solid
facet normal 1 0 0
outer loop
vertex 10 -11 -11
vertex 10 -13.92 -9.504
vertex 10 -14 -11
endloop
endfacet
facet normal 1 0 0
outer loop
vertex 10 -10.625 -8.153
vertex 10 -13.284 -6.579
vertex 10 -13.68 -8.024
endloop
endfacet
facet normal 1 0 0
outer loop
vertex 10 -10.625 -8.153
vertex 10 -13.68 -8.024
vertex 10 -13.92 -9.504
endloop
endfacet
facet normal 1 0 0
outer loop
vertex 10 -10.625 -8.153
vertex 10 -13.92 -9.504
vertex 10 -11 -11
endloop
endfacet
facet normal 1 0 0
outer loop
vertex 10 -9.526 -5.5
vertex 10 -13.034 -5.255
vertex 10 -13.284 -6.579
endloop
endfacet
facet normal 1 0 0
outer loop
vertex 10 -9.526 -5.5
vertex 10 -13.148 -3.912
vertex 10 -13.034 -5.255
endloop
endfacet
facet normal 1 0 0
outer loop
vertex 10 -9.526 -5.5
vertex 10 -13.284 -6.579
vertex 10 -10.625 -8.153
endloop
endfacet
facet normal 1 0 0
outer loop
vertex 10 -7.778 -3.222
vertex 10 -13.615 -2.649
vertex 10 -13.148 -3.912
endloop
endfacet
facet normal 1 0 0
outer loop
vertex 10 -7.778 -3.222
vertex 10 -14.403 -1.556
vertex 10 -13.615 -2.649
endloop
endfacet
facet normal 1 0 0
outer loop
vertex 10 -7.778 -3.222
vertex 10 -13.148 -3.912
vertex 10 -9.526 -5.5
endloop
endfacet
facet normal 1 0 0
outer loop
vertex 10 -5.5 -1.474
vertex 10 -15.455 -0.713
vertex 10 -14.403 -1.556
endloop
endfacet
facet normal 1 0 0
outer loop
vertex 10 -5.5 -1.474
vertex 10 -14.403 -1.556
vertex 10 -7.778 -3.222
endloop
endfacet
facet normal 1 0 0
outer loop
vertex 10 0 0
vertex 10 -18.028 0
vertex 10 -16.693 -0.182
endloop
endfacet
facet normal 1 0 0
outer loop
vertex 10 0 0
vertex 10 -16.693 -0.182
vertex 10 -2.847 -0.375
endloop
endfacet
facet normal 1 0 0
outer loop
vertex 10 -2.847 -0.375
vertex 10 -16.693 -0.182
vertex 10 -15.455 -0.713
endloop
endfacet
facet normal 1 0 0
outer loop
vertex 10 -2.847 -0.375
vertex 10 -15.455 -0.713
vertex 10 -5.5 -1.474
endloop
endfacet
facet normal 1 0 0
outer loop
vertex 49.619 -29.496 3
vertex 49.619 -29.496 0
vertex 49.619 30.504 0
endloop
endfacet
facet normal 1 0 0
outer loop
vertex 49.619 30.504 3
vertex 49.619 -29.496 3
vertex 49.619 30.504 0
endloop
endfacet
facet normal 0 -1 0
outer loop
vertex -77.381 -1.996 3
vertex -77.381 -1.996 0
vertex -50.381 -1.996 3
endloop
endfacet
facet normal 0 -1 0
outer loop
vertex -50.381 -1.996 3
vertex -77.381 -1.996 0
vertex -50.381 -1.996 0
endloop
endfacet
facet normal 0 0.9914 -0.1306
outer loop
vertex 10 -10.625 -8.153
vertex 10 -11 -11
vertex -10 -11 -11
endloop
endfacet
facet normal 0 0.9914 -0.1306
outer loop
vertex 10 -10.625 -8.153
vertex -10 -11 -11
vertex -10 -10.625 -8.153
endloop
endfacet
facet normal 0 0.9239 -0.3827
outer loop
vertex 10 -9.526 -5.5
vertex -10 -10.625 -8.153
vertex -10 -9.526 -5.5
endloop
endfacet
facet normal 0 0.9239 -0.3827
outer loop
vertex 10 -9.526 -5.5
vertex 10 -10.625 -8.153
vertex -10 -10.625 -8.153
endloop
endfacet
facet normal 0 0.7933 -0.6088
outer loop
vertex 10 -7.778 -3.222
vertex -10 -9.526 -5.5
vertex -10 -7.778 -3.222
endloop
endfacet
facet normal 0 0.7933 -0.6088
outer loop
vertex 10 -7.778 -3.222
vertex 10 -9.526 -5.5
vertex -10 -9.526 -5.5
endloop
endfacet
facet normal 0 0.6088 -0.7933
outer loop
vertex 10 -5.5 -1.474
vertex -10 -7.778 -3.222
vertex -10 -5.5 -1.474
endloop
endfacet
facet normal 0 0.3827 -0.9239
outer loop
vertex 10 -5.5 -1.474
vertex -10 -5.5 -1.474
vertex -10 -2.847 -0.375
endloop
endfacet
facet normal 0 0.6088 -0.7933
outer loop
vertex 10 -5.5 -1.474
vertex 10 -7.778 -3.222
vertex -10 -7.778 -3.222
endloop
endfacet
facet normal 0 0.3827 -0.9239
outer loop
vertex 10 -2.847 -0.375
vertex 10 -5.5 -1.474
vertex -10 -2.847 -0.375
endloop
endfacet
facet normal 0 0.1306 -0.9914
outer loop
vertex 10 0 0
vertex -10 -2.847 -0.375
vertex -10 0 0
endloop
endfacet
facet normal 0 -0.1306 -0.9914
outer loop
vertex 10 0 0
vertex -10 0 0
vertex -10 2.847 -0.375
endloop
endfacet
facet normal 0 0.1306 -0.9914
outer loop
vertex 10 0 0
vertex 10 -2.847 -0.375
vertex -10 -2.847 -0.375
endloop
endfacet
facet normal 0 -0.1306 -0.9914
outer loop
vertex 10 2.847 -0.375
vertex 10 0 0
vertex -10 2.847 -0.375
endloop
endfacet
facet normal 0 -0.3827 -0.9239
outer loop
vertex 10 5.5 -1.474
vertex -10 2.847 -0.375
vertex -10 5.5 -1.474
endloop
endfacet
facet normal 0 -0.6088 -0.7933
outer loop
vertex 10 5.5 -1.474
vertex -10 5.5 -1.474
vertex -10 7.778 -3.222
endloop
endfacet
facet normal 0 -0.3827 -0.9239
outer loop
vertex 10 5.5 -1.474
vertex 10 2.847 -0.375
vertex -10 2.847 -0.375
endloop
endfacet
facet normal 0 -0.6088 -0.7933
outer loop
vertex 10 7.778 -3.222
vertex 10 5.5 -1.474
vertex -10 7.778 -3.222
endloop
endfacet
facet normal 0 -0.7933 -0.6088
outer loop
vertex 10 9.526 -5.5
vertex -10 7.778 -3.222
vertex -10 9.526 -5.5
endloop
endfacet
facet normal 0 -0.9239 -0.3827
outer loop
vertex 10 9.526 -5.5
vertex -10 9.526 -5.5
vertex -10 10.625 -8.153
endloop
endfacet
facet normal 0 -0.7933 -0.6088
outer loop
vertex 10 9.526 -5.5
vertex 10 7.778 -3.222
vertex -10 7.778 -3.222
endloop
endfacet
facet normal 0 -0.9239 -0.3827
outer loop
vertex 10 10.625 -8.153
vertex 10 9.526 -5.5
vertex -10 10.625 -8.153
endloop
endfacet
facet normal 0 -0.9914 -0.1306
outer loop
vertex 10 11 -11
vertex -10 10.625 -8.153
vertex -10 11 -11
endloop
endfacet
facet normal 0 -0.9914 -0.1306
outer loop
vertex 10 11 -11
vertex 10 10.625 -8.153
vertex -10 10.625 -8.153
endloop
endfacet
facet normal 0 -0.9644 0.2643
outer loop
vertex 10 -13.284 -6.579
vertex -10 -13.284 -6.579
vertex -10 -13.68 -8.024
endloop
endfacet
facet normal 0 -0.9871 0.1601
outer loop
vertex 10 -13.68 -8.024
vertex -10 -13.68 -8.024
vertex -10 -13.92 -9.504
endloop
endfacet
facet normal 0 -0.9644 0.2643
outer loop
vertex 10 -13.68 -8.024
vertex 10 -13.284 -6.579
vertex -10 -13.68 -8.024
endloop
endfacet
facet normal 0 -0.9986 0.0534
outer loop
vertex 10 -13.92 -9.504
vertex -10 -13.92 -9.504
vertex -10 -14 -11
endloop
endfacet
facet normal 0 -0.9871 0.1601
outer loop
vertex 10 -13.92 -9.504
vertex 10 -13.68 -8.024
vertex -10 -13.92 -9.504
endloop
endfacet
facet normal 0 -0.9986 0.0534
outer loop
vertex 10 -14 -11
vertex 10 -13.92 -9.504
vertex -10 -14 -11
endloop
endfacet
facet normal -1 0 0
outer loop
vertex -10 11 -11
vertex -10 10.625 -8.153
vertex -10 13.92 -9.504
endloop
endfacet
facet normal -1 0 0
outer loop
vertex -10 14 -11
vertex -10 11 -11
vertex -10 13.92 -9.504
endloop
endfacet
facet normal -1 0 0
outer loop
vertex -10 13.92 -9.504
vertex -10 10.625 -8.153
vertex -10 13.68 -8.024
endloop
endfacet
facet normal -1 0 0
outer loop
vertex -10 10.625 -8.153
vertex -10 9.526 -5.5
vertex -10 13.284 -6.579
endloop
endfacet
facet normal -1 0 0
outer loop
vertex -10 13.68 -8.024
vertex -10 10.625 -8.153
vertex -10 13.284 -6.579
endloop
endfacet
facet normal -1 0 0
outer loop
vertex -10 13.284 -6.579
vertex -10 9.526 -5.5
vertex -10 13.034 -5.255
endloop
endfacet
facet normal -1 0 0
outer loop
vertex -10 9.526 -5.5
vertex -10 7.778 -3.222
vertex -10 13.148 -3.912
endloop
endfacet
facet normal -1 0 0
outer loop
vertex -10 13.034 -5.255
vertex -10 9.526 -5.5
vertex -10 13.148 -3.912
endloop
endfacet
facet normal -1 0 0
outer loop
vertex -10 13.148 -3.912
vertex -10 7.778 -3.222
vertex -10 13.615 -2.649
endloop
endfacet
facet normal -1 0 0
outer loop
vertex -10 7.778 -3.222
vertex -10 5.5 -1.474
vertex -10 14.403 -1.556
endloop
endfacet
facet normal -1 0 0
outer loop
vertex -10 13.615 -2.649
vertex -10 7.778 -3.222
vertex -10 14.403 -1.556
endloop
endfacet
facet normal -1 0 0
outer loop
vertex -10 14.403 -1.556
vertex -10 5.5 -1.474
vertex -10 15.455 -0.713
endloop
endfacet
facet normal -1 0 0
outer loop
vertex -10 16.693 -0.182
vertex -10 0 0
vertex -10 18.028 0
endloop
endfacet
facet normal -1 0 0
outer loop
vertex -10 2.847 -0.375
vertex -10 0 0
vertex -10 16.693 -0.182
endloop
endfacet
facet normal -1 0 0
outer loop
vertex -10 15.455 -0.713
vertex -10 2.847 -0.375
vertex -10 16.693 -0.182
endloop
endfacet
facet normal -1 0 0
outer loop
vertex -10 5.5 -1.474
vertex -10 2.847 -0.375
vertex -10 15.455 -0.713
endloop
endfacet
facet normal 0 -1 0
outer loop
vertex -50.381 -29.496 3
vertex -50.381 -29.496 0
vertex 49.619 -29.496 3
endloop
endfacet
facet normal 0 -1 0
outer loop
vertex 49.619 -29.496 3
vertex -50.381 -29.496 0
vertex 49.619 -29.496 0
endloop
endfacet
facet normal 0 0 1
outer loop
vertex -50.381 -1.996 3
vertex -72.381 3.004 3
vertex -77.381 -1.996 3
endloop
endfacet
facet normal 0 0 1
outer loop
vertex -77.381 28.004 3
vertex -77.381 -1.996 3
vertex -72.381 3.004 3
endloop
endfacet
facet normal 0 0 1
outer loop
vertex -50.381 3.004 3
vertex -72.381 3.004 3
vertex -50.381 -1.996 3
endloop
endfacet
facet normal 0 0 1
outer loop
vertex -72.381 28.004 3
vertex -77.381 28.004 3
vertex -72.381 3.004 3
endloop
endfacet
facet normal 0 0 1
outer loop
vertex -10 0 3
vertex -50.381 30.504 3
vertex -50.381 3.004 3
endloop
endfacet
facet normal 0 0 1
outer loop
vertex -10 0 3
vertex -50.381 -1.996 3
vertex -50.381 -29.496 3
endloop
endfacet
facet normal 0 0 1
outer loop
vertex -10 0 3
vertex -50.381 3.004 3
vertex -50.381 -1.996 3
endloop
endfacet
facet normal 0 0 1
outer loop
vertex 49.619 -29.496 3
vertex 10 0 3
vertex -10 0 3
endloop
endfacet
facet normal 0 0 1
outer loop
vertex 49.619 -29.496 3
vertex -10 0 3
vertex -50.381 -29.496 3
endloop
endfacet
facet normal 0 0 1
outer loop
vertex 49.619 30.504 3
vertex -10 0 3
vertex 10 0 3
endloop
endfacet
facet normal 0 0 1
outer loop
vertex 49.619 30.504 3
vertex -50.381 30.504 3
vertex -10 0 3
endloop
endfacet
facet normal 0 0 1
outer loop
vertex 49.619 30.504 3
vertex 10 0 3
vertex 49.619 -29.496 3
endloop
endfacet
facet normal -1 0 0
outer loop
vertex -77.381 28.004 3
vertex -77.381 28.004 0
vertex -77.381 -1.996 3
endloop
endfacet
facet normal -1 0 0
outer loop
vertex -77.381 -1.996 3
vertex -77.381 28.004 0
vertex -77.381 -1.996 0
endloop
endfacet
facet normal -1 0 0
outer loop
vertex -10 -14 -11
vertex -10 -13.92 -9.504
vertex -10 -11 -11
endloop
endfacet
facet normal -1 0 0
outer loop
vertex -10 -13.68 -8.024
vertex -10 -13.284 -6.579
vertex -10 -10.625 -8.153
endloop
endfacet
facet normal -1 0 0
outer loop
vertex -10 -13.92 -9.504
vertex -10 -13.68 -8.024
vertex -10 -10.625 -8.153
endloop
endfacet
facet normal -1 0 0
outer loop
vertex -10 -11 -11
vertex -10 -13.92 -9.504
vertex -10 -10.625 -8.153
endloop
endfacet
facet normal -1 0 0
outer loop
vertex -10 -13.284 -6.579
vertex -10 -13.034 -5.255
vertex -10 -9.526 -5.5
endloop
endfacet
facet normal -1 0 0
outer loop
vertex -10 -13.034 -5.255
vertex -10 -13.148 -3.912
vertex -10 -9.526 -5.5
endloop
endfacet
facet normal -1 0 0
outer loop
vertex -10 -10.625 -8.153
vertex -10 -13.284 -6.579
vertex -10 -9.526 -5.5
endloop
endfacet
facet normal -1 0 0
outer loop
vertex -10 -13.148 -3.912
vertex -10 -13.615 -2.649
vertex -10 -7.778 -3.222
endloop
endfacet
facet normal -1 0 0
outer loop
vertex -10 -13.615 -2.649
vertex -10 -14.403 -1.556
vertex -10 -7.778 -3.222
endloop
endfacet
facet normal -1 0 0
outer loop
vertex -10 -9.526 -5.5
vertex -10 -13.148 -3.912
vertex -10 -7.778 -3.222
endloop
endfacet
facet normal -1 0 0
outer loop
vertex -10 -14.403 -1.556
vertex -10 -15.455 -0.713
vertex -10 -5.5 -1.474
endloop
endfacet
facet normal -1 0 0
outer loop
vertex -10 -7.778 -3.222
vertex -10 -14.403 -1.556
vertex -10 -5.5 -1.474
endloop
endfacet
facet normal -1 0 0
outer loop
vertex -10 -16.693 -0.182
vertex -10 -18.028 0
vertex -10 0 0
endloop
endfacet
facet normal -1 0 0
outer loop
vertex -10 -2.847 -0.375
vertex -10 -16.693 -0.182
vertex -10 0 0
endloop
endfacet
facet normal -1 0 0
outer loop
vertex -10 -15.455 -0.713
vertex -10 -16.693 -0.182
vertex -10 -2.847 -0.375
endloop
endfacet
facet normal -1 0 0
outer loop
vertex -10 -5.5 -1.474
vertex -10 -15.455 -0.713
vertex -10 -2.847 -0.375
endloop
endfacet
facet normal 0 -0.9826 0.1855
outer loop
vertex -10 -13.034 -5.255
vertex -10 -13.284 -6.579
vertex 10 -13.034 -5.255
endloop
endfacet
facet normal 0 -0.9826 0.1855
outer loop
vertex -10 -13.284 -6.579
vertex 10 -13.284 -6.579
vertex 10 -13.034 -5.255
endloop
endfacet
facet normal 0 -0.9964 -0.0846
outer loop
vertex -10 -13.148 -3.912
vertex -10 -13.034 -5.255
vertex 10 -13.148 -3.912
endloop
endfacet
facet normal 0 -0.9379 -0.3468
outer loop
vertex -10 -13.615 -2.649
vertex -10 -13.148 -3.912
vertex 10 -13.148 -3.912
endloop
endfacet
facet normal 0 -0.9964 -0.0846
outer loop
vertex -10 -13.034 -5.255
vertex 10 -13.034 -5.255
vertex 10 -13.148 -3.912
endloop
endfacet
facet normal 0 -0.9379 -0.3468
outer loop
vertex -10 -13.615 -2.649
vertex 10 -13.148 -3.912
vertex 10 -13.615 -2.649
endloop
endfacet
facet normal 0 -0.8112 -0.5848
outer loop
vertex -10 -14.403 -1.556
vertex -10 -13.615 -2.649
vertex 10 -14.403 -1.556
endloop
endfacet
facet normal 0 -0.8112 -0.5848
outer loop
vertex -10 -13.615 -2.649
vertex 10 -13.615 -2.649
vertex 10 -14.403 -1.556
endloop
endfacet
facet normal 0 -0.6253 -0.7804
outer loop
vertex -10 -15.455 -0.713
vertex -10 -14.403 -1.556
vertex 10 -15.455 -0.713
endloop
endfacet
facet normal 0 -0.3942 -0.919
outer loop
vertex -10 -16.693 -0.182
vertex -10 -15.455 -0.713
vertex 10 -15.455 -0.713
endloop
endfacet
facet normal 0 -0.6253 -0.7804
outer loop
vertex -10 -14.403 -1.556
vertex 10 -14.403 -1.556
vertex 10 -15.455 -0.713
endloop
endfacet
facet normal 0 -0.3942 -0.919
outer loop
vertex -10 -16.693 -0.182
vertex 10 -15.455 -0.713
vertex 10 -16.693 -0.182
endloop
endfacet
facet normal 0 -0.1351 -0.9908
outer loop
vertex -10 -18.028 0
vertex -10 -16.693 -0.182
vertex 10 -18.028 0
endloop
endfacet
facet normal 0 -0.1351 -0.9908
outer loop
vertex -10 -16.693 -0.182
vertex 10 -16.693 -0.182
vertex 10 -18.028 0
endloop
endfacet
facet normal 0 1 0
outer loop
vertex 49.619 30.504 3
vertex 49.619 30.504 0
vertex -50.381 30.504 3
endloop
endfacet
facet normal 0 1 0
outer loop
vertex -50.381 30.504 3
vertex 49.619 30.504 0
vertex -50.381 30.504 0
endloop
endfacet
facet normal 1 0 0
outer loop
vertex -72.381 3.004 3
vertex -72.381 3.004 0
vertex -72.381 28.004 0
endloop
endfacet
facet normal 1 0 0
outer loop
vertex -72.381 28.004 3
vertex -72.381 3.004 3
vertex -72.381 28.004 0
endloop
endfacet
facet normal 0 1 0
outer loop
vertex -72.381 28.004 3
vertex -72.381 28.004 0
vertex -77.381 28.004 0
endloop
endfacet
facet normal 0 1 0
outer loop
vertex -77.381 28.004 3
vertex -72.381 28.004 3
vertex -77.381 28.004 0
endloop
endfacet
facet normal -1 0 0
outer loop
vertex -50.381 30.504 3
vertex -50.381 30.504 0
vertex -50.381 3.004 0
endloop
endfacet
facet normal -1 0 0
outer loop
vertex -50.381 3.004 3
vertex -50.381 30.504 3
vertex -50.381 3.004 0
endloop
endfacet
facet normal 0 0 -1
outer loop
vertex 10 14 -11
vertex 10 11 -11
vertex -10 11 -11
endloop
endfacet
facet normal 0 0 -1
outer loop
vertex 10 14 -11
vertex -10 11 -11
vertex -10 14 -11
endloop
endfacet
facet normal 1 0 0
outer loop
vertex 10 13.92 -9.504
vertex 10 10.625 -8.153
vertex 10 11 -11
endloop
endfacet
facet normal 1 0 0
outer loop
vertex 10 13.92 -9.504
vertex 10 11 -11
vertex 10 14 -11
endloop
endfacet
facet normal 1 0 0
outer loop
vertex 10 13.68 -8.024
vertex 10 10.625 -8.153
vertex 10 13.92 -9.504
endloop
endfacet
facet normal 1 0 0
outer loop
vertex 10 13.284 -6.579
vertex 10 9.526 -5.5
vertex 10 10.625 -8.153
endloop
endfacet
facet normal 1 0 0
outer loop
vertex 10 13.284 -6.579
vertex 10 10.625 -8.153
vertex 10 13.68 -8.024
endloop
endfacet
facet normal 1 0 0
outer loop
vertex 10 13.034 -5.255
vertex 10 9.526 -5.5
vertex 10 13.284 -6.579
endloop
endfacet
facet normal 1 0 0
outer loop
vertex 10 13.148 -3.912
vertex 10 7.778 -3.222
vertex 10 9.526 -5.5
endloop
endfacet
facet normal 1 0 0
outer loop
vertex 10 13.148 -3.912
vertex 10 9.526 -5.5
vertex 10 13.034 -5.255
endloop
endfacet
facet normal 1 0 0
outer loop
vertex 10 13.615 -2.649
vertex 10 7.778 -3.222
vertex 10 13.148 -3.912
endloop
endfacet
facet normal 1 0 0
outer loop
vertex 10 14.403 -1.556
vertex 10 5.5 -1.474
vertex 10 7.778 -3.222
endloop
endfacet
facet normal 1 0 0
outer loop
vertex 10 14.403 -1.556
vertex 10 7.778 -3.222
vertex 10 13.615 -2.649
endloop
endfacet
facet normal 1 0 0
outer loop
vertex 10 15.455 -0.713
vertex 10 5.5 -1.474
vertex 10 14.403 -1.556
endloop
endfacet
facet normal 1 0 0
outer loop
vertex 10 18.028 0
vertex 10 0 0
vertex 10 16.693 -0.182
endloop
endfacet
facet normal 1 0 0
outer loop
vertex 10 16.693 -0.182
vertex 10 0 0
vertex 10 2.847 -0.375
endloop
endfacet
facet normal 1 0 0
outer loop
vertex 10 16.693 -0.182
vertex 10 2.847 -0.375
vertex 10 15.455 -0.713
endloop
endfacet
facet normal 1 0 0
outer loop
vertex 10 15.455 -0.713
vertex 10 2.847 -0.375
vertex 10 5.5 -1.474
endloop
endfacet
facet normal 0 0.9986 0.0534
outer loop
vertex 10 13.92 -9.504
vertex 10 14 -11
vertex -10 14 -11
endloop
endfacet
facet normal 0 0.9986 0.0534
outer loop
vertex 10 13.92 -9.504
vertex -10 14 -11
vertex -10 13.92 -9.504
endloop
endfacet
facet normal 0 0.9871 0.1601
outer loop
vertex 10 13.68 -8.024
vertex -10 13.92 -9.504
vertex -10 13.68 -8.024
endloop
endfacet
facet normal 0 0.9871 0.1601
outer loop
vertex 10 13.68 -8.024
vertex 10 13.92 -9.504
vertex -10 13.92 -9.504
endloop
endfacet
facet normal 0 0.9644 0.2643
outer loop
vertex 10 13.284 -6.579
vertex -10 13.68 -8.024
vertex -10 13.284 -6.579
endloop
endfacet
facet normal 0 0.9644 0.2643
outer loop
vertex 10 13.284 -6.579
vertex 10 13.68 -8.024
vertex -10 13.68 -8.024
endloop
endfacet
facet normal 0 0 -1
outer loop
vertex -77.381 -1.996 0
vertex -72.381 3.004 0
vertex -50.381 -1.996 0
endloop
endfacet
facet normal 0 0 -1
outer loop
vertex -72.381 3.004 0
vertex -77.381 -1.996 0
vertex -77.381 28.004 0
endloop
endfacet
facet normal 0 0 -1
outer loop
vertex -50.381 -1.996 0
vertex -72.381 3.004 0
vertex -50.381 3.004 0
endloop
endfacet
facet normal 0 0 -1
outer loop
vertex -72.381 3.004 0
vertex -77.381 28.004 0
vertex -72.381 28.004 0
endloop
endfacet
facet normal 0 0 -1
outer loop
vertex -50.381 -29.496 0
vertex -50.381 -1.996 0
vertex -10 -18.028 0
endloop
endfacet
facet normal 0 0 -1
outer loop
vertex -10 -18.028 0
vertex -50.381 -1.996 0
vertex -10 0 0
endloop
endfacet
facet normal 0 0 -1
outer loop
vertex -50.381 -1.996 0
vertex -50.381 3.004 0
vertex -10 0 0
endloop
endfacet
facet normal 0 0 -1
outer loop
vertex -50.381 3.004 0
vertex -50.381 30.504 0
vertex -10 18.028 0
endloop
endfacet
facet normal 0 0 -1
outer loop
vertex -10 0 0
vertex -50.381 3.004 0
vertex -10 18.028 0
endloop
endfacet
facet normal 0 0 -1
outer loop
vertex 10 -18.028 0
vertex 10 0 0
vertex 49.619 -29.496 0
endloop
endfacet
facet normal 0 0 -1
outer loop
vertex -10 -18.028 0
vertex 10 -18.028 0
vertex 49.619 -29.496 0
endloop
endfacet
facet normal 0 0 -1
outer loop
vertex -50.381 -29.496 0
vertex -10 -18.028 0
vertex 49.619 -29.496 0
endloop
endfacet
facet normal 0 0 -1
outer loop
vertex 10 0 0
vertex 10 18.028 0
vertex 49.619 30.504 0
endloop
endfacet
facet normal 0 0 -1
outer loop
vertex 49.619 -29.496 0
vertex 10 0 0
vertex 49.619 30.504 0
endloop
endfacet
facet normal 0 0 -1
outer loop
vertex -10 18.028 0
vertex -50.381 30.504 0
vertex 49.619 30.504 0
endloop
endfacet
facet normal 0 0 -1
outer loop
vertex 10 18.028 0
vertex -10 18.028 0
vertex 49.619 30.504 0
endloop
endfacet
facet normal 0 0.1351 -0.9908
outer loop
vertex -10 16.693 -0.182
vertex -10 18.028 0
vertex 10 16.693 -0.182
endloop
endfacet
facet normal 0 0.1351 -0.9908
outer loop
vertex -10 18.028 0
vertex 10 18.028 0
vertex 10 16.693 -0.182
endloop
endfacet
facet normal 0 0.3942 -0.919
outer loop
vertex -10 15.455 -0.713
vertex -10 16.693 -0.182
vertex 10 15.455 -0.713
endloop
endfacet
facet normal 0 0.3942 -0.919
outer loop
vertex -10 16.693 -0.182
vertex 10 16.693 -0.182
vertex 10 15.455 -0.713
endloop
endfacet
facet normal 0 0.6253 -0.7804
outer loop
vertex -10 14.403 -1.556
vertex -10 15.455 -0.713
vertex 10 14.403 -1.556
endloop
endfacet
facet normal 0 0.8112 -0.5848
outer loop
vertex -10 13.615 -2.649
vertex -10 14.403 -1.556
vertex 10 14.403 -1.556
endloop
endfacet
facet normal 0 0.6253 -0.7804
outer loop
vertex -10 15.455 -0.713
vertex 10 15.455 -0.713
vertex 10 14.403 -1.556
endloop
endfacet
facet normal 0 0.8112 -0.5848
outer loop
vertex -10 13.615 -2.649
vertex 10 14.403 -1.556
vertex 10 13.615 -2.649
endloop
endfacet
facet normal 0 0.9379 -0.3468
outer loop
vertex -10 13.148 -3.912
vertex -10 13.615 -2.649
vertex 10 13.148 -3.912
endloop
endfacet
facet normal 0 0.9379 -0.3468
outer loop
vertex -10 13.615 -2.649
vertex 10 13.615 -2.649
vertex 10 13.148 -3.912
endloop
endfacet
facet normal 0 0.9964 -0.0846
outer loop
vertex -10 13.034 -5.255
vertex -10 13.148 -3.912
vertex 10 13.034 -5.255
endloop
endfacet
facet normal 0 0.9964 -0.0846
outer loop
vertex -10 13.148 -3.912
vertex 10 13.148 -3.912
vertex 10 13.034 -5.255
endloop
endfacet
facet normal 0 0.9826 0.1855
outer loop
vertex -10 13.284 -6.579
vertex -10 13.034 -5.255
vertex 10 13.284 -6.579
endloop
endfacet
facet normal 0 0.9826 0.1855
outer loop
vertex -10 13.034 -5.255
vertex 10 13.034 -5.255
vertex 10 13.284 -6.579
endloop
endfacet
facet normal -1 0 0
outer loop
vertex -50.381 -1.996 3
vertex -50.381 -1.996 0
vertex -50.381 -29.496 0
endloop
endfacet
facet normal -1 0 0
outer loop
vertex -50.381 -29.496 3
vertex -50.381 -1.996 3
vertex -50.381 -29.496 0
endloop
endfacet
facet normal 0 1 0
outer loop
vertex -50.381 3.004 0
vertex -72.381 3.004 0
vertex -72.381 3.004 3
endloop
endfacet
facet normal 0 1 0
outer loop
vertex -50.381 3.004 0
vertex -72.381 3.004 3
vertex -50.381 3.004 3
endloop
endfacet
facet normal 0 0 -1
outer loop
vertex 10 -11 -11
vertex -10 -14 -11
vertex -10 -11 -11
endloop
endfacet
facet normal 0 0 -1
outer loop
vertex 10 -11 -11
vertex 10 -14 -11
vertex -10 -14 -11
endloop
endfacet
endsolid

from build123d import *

# Parameters (mm, degrees)
F0_W     = 22
F0_H     = 5
F1_DEPTH = 3
F3_DEPTH = 10
F4_R     = 5


with BuildPart() as f1:
    # F0 (on Top) → F1 (new body)
    with BuildSketch(Plane.XY):
        Polygon((49.618883726, 30.5037726198), (-50.381116274, 30.5037726198), (-50.381116274, 3.0037726198), (-50.381116274, -1.9962273802), (-50.381116274, -29.4962273802), (49.618883726, -29.4962273802), align=None)
        with Locations((-61.381116274, 0.5037726198)):
            Rectangle(F0_W, F0_H)
        Polygon((-72.381116274, -1.9962273802), (-72.381116274, 3.0037726198), (-72.381116274, 28.0037726198), (-77.381116274, 28.0037726198), (-77.381116274, -1.9962273802), align=None)
    extrude(amount=F1_DEPTH)

    # F2 (on Right) → F3 (join, symmetric)
    with BuildSketch(Plane.YZ):
        with BuildLine():
            ThreePointArc((-11, -11), (0, 0), (11, -11))
            Line((11, -11), (14, -11))
            ThreePointArc((14, -11), (0, 3), (-14, -11))
            Line((-14, -11), (-11, -11))
        make_face()
    extrude(amount=F3_DEPTH, both=True)

    # F4
    f4_edges = [f1.edges().sort_by_distance(p)[0] for p in [
        (0, -8.660254, 0),
        (0, 8.660254, 0),
    ]]
    fillet(f4_edges, radius=F4_R)


solid = f1.part
